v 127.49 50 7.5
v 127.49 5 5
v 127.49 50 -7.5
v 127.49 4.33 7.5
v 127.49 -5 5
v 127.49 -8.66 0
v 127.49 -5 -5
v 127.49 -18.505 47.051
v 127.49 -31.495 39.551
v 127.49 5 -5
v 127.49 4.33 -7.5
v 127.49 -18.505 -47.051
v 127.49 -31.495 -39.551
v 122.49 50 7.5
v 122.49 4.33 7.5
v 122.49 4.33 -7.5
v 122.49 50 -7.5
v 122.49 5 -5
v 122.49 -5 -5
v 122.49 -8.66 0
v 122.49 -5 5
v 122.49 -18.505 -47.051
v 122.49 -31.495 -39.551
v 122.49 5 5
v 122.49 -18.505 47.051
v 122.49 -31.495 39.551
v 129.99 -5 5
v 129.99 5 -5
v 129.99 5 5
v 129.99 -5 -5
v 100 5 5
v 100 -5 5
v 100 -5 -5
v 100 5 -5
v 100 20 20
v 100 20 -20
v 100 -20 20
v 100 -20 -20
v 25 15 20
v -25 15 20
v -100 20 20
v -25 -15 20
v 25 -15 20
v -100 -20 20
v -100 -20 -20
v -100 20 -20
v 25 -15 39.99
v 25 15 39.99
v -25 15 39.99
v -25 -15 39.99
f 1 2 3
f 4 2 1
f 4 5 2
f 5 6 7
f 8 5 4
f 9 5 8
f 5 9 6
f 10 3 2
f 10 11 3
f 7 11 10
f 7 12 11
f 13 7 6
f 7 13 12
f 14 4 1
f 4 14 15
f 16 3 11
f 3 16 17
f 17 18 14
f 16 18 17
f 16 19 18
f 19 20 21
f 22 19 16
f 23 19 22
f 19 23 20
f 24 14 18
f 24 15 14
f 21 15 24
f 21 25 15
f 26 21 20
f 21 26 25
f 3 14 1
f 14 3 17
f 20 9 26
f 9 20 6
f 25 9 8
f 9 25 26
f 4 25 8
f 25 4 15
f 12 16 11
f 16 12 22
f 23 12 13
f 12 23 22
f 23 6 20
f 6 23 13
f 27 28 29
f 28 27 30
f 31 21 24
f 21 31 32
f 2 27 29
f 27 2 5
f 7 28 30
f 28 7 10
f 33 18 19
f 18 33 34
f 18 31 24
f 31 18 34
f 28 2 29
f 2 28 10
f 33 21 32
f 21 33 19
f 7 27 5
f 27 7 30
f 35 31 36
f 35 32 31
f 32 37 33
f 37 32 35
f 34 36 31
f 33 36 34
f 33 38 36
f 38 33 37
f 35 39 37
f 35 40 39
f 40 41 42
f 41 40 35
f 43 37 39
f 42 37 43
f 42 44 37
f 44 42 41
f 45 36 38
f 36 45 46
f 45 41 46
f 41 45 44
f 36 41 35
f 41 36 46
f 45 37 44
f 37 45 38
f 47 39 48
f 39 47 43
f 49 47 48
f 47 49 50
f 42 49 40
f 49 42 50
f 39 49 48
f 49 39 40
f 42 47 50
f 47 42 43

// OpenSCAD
module avion_corps(acf_lg=200, acf_pf=40, acf_ht=40)
{
//    acf_lg = 200;
//    acf_pf = 40;
//    acf_ht = 40;
    
    avion_corps_fuselage(acf_lg, acf_pf, acf_ht);
    
    acn_lg = 30;
    acn_pf = 10;
    acn_ht = 10;
    
    translate([acf_lg/2-0.01, 0, 0])
    avion_corps_nez(acn_lg, acn_pf, acn_ht, 5, 50, 15, 3);
    
    ach_lg = 50;
    ach_pf = 30;
    ach_ht = 20;
    
    translate([-ach_lg/2, -ach_pf/2, acf_ht/2-0.01])
    avion_corps_habitacle(ach_lg, ach_pf, ach_ht);
}

module avion_corps_fuselage(lg, pf, ht)
{
    cube([lg, pf, ht], center=true);
}

module avion_corps_nez(lg, pf, ht, pale_lg, pale_pf, pale_ht, pale_nb)
{
    translate([0, -pf/2, -ht/2])
    cube([lg, pf, ht]);
    
    rotate([$t*360*10,0,0])
    for (i=[0:pale_nb])
        rotate([360/pale_nb*i,0,0])
        translate([lg-pale_lg*1.5, 0, -pale_ht/2])
        cube([pale_lg, pale_pf, pale_ht]);
}

module avion_corps_habitacle(lg, pf, ht)
{
    cube([lg, pf, ht]);
}

avion_corps();
